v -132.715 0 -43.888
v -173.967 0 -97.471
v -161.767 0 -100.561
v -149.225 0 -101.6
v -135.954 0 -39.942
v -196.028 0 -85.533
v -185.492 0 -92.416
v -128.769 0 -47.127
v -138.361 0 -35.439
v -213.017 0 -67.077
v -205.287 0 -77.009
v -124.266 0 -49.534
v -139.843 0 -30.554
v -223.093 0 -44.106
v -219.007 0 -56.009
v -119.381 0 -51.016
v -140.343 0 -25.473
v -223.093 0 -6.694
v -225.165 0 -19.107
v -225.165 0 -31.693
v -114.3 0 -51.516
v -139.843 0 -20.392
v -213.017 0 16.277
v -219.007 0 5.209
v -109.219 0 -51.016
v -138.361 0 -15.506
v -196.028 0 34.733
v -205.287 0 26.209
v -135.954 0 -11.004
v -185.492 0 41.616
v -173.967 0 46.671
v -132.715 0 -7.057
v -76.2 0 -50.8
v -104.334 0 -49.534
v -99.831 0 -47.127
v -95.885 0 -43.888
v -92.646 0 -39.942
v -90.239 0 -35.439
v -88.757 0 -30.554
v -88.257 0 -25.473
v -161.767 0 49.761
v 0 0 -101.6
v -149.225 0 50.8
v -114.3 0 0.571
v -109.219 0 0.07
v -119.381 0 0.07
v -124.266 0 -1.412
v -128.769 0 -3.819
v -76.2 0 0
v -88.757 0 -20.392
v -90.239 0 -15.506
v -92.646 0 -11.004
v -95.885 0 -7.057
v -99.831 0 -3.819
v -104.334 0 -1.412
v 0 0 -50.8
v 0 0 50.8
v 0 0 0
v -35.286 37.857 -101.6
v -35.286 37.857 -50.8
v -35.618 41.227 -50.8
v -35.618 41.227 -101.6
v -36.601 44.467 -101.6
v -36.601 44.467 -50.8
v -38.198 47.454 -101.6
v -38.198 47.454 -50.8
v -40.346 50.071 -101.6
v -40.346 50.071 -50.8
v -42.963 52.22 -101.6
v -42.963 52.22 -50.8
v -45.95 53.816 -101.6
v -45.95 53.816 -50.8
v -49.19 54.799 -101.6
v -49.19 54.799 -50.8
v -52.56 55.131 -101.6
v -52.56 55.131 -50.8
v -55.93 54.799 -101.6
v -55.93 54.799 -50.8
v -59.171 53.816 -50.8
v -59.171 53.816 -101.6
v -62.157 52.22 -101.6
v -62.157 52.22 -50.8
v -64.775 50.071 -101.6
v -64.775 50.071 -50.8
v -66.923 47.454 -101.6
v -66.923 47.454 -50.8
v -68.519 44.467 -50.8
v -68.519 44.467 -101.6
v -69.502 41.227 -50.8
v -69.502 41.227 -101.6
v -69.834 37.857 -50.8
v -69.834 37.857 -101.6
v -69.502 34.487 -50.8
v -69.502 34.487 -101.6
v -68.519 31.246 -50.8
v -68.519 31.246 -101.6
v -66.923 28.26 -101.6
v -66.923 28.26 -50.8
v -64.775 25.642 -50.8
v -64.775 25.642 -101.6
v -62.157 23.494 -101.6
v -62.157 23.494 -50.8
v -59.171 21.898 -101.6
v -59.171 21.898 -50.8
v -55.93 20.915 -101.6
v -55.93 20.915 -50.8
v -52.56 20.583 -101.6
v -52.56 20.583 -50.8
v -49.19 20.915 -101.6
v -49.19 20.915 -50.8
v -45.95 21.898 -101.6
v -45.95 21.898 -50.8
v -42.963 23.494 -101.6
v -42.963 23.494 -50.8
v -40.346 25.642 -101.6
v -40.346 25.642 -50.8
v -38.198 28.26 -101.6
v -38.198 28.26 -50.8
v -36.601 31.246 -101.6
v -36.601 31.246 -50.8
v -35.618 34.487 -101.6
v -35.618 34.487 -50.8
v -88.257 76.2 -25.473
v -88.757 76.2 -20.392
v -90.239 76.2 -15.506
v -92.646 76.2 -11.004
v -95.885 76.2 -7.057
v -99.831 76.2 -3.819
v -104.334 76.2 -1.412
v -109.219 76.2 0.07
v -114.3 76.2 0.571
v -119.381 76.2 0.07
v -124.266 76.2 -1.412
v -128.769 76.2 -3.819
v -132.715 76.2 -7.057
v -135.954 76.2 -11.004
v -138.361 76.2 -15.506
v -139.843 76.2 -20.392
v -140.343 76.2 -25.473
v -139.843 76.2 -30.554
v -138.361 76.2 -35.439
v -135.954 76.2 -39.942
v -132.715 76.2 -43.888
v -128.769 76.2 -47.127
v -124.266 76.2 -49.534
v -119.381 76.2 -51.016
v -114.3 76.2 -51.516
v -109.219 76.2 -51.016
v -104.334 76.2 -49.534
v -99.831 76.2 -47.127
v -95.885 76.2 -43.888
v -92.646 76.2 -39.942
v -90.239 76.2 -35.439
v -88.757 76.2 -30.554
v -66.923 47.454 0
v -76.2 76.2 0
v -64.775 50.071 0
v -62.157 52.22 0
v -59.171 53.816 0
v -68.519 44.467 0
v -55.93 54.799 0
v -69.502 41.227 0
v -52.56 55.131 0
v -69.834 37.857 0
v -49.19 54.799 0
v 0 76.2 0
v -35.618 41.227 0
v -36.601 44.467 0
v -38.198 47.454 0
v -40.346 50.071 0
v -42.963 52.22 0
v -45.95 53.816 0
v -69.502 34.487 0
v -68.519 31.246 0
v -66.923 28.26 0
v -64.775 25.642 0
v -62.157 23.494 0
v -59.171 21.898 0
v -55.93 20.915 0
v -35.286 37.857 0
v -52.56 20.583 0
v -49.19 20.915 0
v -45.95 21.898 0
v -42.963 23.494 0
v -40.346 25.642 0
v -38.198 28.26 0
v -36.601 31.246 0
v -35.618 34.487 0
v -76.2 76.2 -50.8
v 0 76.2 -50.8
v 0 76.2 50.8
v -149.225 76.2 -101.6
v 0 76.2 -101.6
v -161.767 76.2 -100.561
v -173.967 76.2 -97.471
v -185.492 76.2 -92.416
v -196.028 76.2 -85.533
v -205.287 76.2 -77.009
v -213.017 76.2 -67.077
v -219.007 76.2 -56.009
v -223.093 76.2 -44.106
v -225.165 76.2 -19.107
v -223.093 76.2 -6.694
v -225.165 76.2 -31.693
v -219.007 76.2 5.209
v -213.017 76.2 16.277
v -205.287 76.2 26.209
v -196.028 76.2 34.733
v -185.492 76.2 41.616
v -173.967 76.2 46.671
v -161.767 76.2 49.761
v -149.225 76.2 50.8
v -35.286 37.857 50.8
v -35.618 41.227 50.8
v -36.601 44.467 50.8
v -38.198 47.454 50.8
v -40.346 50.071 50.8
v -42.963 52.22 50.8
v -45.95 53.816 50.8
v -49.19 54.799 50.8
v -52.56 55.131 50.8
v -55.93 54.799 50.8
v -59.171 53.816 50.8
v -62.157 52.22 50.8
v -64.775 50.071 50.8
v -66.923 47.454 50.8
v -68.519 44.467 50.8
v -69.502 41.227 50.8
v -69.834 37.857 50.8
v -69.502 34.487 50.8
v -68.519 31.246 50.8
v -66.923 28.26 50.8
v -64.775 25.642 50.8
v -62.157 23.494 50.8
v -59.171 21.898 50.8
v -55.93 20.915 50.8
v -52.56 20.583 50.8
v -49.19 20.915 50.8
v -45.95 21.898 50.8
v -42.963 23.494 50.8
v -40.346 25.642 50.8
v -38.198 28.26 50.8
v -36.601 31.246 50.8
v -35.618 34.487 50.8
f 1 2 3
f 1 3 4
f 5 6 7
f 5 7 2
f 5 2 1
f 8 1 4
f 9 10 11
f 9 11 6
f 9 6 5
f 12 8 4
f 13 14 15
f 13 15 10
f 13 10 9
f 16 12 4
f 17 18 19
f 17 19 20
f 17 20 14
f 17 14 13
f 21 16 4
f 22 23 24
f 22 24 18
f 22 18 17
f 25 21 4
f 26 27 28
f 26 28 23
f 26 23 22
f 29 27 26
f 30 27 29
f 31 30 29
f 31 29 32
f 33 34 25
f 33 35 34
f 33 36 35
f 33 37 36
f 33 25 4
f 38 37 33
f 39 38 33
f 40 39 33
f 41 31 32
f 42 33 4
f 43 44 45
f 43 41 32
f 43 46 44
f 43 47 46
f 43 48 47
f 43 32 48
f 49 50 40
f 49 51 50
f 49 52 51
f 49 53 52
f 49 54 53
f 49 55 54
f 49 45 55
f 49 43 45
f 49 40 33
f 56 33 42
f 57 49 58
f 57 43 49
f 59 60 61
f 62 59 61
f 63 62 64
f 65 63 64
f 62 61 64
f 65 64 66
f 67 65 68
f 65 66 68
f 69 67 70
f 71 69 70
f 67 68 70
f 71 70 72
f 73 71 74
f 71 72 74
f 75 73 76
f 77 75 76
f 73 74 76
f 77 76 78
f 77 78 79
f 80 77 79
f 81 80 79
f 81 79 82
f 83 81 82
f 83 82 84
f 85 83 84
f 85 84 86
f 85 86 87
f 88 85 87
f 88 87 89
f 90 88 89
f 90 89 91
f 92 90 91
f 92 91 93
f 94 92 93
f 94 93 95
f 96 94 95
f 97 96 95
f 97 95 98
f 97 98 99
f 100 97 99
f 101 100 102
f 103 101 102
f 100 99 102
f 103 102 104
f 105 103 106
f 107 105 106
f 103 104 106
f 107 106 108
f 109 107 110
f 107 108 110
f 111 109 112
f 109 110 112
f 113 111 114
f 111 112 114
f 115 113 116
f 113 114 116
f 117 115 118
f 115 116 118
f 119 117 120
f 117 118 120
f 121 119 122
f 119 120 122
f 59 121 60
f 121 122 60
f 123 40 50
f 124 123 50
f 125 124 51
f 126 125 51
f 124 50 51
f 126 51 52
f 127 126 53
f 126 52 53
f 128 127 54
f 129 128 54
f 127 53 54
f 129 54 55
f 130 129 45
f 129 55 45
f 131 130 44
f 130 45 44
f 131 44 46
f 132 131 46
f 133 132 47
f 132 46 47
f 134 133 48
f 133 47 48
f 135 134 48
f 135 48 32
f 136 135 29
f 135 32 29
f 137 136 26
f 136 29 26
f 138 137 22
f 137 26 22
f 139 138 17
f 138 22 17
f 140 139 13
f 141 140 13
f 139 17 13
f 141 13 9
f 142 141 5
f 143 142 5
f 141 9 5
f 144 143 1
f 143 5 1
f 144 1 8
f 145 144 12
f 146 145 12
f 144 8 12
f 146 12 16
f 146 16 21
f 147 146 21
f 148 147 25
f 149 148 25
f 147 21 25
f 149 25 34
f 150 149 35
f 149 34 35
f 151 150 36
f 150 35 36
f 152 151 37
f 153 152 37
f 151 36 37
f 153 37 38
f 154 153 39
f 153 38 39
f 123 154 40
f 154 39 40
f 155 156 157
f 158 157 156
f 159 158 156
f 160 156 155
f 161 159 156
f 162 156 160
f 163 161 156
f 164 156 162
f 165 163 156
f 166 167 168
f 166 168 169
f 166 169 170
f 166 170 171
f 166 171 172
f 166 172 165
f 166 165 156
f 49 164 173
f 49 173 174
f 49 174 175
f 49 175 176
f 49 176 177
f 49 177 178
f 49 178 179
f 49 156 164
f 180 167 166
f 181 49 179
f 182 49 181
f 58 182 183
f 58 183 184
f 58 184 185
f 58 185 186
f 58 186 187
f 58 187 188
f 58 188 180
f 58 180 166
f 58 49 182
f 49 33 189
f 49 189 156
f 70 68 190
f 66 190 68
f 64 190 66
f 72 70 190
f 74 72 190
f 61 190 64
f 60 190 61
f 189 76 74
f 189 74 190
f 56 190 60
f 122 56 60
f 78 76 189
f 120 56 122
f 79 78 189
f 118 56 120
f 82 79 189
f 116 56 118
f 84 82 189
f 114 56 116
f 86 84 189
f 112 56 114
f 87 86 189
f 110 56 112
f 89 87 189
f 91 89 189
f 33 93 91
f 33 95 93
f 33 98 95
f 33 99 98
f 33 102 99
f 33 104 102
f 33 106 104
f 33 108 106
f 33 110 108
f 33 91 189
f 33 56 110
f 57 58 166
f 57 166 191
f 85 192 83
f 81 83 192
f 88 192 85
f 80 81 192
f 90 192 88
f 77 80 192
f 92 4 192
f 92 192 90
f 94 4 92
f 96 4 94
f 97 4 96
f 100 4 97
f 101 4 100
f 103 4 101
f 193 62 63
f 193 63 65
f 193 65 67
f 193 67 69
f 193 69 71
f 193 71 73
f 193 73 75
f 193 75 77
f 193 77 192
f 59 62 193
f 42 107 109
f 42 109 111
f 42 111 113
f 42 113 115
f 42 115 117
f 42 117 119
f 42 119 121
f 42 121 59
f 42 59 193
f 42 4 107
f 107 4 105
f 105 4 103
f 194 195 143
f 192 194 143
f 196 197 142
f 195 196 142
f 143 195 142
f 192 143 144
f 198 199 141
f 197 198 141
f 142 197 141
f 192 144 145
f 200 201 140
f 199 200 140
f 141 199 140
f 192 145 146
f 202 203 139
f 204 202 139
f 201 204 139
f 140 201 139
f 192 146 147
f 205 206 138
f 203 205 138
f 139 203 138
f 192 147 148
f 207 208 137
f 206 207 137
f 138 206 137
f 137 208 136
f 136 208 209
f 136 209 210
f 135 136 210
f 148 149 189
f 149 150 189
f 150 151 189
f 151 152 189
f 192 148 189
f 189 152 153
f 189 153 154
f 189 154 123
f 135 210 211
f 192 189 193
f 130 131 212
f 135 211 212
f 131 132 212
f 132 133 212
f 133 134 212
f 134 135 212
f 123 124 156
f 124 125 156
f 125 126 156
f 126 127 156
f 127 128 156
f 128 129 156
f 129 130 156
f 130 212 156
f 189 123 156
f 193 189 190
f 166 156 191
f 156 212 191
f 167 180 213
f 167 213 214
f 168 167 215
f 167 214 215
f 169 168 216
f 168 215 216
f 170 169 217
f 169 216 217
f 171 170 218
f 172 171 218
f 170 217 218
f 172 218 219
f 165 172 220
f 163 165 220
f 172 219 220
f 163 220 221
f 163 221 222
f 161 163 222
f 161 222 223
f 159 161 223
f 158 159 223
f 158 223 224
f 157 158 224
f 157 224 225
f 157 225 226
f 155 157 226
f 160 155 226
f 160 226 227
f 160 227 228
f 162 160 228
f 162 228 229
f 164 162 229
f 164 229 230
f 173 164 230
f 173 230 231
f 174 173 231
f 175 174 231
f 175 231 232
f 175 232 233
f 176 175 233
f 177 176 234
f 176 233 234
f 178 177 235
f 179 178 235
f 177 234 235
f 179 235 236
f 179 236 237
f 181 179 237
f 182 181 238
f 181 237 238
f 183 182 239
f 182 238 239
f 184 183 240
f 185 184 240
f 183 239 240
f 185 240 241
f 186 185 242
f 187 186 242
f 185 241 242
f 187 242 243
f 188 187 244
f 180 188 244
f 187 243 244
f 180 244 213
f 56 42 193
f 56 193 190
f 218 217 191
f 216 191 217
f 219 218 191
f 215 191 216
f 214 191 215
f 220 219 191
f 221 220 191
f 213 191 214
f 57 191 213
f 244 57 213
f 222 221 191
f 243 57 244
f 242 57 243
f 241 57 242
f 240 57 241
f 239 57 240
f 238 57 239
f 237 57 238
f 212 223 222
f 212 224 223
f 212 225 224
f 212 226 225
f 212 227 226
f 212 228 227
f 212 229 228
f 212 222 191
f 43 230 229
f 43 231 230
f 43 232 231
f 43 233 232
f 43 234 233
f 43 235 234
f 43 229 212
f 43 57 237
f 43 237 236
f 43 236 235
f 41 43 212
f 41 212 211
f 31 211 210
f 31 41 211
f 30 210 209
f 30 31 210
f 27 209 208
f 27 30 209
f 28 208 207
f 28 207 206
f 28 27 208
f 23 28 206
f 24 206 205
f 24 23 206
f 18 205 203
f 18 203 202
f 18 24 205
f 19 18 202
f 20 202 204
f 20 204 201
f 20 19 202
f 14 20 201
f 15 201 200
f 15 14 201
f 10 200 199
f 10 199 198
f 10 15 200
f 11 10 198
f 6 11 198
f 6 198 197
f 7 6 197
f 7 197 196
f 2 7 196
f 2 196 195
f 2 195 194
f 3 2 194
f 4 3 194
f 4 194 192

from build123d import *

# Parameters (mm, degrees)
F0_R     = 26.043361
F1_DEPTH = 76.2
F2_R     = 17.27391
F3_DEPTH = 152.4


with BuildPart() as f1:
    # F0 (on Front) → F1 (new body)
    with BuildSketch(Plane.XZ):
        with BuildLine():
            Line((-76.2, 0), (0, 0))
            Line((0, 0), (0, 50.8))
            Line((0, 50.8), (-149.225, 50.8))
            ThreePointArc((-149.225, 50.8), (-225.425, -25.4), (-149.225, -101.6))
            Line((-149.225, -101.6), (0, -101.6))
            Line((0, -101.6), (0, -50.8))
            Line((0, -50.8), (-76.2, -50.8))
            Line((-76.2, -50.8), (-76.2, 0))
        make_face()
        with Locations((-114.3, -25.472846)):
            Circle(F0_R, mode=Mode.SUBTRACT)
    extrude(amount=-F1_DEPTH)

    # F2 (on face) → F3 (cut)
    with BuildSketch(Plane.XY.offset(50.8)):
        with Locations((-52.560348, 37.856806)):
            Circle(F2_R)
    extrude(amount=-F3_DEPTH, mode=Mode.SUBTRACT)


solid = f1.part
